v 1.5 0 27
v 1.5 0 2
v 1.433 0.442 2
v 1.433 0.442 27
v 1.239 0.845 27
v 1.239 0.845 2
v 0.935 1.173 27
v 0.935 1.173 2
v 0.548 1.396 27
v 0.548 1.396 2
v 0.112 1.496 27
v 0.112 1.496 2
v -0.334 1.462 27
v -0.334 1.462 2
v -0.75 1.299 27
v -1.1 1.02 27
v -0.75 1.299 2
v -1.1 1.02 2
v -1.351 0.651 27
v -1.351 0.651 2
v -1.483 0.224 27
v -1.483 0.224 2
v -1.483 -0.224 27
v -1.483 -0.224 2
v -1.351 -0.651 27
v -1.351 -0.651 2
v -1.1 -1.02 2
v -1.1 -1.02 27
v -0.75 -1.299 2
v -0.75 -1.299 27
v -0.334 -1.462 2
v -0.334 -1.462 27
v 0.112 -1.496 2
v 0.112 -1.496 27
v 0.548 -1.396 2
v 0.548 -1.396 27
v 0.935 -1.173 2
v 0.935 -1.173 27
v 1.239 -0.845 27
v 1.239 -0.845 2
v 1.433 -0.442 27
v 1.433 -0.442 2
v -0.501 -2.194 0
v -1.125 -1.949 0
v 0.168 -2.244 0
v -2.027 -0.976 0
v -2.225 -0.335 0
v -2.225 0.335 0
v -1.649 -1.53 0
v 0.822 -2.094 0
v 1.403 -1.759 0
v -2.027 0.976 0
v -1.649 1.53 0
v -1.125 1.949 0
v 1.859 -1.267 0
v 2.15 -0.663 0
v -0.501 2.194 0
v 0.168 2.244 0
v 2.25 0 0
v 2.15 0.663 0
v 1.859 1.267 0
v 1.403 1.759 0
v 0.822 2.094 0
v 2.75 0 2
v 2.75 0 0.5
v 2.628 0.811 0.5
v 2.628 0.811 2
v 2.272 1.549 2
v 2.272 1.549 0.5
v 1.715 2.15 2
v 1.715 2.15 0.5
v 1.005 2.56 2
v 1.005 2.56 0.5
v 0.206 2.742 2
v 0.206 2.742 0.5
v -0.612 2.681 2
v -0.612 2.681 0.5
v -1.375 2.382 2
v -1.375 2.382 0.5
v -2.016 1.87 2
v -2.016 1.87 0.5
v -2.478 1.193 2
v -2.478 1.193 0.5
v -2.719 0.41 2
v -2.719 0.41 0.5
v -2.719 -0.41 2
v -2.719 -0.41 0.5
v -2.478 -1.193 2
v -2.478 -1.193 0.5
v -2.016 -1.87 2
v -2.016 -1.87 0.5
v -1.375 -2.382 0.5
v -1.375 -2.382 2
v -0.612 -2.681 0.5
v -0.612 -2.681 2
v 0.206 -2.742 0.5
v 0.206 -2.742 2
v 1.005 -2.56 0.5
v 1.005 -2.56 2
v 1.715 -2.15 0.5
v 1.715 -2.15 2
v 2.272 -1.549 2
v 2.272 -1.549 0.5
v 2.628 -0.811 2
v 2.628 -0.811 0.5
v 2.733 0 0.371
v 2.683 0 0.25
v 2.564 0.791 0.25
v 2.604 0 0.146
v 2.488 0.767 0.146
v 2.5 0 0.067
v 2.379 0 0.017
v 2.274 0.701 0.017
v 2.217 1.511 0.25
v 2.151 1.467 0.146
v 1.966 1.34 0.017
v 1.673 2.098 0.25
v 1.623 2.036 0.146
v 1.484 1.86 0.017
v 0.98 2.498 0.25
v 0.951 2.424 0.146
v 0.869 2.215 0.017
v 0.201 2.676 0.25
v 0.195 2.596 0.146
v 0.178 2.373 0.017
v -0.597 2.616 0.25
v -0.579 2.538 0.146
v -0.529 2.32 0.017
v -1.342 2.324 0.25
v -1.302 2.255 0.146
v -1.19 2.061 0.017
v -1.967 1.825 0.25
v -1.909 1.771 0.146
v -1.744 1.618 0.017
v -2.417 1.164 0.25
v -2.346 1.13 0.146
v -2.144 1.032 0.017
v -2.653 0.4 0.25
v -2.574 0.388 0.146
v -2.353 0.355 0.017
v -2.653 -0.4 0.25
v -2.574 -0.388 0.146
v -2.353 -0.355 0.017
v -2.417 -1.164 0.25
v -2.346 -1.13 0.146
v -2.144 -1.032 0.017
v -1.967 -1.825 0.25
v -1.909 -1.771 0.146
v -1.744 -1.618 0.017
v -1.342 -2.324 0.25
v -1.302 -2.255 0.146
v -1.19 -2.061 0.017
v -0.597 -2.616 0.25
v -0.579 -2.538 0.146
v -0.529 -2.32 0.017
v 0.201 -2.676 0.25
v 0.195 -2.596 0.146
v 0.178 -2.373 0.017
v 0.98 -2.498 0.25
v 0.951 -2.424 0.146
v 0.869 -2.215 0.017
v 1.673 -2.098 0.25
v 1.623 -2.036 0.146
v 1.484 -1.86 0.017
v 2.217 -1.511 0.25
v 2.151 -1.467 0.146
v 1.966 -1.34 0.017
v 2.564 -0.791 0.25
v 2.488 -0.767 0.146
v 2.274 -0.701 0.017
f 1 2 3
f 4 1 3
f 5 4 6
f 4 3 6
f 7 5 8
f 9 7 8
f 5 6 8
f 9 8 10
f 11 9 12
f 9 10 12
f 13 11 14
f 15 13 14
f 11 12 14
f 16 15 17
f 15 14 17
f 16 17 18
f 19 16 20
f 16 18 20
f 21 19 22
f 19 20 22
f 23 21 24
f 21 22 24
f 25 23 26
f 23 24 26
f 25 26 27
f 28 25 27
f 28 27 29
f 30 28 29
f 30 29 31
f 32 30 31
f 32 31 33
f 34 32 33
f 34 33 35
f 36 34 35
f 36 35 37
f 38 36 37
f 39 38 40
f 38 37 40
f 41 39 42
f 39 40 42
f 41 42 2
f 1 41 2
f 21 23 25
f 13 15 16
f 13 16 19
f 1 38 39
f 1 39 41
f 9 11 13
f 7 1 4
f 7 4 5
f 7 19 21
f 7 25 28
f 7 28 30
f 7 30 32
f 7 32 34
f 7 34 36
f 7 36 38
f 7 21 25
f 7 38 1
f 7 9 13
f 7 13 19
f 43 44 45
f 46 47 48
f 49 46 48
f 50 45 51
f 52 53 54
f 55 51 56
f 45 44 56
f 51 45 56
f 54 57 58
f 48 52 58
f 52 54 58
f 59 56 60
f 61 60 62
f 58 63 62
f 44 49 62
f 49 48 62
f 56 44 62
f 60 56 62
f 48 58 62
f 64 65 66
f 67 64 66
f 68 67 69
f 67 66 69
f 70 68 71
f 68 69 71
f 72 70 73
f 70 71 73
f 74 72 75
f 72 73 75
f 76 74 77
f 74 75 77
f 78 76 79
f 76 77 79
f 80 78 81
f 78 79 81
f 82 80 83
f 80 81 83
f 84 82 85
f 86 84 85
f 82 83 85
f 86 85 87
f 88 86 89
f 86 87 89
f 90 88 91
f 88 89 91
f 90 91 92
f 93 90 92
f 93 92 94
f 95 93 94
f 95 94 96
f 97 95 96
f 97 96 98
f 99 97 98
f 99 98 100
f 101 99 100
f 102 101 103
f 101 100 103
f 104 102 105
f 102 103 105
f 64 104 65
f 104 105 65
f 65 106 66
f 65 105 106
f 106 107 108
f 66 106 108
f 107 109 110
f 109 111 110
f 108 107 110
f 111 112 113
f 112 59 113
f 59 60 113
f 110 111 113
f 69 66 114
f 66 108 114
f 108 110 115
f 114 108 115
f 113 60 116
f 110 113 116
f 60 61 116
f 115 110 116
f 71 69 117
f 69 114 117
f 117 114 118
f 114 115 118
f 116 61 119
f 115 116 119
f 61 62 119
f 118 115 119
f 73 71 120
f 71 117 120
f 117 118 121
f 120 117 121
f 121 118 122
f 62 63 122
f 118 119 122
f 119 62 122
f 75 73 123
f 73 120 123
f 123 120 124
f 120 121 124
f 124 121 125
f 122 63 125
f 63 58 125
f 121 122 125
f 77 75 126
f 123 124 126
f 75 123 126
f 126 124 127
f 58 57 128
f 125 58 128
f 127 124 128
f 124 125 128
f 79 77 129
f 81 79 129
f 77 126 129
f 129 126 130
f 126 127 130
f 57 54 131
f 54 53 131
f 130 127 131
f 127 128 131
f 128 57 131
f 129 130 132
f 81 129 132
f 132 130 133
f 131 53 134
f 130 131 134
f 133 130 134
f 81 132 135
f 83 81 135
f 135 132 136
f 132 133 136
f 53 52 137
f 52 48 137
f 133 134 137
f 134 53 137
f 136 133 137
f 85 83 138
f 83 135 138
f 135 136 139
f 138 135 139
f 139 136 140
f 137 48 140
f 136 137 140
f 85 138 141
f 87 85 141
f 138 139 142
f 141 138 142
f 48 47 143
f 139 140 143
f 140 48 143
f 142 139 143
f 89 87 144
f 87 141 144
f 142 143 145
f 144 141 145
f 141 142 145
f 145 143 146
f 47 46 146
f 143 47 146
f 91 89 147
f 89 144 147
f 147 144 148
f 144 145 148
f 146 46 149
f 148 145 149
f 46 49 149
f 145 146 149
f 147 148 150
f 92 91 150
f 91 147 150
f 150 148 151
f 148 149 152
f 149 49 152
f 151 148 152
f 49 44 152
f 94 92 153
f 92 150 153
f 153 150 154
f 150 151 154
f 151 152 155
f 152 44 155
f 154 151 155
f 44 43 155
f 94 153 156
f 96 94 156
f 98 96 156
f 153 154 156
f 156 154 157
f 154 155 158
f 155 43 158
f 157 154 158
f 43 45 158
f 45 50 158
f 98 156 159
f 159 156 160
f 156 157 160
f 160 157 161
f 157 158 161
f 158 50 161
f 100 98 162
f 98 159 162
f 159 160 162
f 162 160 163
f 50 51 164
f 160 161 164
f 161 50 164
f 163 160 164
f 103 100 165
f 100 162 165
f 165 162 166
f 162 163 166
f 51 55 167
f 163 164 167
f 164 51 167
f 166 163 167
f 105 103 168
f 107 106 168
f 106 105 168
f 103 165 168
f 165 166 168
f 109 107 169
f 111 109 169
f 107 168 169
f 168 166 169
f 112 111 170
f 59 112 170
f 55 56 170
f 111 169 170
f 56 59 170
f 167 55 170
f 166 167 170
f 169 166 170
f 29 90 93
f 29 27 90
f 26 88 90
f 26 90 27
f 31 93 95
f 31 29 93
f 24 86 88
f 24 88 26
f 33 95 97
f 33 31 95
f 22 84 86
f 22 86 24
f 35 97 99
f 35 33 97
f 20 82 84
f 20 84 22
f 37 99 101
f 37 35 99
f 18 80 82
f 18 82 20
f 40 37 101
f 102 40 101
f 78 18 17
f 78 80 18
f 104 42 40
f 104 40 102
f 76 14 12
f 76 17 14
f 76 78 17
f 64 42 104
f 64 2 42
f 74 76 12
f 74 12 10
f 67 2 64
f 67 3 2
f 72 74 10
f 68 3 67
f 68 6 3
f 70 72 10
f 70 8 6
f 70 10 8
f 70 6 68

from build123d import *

# Parameters (mm, degrees)
SKETCH_R     = 2.75
PAD_DEPTH    = 2
SKETCH001_R  = 1.5
PAD001_DEPTH = 25
FILLET_R     = 0.5


with BuildPart() as part:
    # Sketch → Pad (new body)
    with BuildSketch(Plane.XY):
        Circle(SKETCH_R)
    extrude(amount=PAD_DEPTH)

    # Sketch001 → Pad001 (new body)
    with BuildSketch(Plane.XY.offset(2)):
        Circle(SKETCH001_R)
    extrude(amount=PAD001_DEPTH)

    # Fillet
    fillet_edges = [part.edges().sort_by_distance(p)[0] for p in [
        (-2.75, 0, 0),
    ]]
    fillet(fillet_edges, radius=FILLET_R)


solid = part.part
